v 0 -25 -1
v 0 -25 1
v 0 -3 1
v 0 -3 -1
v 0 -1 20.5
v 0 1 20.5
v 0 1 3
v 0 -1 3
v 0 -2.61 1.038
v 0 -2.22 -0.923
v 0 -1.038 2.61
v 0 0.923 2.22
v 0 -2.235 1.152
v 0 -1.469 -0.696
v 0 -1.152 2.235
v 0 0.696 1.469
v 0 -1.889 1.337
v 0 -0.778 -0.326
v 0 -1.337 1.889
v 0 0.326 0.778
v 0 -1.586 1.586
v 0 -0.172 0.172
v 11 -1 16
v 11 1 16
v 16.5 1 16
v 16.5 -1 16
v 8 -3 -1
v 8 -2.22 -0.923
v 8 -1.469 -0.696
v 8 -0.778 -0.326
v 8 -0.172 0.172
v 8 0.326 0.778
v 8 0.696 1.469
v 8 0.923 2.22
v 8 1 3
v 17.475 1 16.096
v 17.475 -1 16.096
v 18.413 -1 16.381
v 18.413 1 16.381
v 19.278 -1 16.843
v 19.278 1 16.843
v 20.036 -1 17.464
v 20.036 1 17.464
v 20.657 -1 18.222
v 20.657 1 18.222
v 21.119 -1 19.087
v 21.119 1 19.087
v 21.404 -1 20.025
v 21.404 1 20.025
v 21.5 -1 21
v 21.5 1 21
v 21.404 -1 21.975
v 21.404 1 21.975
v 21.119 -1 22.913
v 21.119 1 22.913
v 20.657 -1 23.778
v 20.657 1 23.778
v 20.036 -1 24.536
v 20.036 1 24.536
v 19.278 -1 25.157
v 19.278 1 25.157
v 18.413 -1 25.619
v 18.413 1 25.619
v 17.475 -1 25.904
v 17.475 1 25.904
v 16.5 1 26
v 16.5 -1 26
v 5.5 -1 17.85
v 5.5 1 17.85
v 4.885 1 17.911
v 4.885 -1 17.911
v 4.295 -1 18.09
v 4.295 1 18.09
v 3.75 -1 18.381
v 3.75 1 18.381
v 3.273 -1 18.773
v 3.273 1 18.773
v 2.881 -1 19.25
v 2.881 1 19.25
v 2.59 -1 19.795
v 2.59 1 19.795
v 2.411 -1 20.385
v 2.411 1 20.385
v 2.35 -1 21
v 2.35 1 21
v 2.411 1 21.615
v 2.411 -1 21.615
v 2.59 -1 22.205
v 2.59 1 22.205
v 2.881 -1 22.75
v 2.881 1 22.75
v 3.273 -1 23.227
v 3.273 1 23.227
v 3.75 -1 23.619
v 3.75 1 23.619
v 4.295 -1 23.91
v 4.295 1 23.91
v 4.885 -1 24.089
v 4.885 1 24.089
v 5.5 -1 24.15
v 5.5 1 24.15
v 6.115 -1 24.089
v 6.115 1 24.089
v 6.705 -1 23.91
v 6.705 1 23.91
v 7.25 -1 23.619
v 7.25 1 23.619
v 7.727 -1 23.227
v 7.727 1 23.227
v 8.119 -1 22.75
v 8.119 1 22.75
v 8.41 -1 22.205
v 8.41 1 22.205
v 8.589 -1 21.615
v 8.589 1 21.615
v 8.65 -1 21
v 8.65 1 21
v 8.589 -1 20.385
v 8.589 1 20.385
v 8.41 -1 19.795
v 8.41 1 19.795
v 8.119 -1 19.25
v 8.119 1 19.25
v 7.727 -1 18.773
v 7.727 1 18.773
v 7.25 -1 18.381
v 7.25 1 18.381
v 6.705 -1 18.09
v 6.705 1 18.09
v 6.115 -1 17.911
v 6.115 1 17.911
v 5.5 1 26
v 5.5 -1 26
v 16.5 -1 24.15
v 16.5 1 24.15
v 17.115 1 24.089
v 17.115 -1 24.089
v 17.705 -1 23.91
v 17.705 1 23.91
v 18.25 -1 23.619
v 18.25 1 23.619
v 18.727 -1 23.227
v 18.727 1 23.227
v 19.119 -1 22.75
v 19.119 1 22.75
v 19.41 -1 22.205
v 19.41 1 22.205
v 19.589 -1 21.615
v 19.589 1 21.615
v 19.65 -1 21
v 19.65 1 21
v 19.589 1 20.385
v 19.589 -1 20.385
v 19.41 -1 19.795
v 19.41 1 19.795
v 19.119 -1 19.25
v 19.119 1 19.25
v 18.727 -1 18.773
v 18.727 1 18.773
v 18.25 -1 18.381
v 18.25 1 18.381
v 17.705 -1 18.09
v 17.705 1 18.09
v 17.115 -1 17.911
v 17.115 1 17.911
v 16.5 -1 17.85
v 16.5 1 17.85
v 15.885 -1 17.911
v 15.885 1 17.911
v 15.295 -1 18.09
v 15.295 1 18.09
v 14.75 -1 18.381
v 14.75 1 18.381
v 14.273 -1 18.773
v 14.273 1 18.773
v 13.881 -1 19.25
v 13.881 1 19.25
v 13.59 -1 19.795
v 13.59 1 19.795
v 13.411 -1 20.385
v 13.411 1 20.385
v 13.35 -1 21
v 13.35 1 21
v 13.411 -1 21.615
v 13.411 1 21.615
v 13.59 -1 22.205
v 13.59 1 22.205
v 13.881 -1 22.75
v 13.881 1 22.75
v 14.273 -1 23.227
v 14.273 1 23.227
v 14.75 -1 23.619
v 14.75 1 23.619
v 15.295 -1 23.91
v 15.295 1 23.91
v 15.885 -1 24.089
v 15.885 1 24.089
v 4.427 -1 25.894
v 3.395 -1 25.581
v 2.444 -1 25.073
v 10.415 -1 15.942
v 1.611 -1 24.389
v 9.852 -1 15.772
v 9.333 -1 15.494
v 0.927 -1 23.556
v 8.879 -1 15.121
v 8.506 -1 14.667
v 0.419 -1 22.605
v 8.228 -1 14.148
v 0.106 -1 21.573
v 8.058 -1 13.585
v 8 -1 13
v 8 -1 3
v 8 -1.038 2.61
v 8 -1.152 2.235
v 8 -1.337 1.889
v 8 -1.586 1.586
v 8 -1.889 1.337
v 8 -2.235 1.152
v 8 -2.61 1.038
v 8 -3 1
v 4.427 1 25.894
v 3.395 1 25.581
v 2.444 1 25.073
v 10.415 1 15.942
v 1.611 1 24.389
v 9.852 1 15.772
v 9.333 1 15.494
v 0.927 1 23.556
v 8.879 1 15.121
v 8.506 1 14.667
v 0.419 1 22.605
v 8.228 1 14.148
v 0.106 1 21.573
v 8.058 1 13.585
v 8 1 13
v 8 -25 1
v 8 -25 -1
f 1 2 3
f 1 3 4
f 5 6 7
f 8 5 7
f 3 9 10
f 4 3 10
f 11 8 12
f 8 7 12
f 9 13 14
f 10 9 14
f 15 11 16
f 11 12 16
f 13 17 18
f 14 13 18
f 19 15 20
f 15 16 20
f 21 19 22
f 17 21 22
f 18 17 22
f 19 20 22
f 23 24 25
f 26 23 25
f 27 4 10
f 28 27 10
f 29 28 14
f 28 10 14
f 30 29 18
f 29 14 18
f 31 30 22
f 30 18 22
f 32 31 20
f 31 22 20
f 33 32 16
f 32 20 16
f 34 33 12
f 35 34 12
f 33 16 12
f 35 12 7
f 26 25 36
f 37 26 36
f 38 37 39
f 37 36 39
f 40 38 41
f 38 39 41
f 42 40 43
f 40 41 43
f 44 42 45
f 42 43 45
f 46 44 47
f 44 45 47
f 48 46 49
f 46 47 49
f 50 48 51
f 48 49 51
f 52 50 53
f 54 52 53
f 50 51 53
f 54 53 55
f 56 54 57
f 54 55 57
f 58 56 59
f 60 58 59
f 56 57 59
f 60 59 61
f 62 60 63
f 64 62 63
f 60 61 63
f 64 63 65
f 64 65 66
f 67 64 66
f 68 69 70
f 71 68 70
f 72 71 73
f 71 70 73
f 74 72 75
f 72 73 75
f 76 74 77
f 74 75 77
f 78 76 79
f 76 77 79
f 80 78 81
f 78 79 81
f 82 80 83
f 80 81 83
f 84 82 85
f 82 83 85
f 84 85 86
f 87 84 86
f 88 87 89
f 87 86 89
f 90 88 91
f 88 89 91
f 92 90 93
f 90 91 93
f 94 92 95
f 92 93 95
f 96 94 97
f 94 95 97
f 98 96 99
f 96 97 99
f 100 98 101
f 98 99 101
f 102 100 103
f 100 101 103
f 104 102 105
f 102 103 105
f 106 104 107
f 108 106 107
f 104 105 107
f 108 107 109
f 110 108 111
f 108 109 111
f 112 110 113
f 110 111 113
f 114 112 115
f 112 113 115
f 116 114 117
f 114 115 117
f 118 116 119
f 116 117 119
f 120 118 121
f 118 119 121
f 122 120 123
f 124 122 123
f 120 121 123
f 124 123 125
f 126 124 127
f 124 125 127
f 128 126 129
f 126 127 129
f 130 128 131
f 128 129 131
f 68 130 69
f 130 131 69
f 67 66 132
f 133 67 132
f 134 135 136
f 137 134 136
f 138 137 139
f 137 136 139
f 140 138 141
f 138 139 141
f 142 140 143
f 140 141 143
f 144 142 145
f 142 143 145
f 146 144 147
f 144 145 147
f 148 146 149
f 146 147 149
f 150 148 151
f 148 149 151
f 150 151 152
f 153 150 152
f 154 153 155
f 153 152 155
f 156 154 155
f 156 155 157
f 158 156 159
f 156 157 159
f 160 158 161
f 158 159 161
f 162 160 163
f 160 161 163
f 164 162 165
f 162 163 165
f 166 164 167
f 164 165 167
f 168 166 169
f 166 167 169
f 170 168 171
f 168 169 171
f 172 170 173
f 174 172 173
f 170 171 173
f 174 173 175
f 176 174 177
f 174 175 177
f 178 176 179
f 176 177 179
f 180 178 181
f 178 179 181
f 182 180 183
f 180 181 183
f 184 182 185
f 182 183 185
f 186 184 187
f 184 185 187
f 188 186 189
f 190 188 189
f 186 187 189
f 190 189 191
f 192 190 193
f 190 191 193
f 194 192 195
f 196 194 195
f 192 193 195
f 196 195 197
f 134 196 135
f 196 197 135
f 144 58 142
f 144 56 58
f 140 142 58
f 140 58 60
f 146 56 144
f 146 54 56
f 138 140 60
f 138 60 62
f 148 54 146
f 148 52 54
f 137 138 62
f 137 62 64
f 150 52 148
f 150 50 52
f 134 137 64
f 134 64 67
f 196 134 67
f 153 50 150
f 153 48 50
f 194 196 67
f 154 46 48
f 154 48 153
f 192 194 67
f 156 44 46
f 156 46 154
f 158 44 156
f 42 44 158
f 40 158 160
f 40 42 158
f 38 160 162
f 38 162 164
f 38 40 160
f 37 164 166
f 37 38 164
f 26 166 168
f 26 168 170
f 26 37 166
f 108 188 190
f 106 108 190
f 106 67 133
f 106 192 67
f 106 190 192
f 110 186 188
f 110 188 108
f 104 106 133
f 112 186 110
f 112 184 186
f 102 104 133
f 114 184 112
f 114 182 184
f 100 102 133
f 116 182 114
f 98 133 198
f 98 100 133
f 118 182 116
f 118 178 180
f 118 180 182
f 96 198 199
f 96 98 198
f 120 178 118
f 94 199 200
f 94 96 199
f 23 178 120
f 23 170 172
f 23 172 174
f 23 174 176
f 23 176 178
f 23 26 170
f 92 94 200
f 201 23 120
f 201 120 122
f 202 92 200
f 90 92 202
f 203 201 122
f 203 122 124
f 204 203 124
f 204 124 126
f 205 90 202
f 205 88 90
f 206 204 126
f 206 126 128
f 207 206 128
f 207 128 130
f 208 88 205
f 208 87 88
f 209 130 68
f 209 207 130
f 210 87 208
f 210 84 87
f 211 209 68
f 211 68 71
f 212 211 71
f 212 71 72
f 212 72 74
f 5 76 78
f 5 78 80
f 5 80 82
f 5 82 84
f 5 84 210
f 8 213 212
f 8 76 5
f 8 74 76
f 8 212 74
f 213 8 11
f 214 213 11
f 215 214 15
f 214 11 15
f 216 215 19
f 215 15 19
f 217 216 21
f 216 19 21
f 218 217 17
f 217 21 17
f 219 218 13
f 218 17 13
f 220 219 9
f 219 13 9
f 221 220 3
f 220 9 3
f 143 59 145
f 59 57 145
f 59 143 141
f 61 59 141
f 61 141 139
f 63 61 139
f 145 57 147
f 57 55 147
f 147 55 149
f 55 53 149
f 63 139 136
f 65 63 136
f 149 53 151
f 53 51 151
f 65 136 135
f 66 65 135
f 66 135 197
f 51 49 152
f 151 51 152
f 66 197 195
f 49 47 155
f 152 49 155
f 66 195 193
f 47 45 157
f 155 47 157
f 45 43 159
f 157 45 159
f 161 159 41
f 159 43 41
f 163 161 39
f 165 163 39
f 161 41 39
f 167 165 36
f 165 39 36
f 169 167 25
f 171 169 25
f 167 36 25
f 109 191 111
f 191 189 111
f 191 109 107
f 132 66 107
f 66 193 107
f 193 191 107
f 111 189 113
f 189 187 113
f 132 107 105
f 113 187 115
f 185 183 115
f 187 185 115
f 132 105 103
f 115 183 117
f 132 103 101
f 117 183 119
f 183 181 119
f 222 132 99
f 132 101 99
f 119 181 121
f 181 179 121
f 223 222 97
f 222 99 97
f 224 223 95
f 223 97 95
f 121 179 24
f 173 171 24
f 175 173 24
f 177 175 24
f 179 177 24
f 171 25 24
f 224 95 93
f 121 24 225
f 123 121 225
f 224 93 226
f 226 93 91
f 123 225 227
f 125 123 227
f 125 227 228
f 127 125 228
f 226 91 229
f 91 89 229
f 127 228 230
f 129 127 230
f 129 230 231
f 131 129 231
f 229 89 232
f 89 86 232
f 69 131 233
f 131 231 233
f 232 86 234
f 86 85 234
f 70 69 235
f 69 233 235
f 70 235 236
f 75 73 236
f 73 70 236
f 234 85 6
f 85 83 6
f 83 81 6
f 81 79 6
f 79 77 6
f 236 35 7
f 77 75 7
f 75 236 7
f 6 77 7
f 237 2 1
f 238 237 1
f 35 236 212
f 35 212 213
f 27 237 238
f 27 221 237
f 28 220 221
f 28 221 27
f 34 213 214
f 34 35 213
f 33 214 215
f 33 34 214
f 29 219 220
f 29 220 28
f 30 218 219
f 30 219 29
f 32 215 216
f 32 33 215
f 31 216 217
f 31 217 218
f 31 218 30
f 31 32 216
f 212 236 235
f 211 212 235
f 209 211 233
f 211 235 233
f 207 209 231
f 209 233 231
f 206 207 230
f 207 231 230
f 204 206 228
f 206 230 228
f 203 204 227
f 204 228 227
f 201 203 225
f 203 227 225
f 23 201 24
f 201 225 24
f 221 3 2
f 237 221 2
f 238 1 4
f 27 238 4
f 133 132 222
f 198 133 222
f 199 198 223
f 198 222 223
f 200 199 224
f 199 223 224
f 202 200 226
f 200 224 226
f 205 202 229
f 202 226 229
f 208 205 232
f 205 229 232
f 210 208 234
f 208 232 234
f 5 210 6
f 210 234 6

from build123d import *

# Parameters (mm, degrees)
EXTRUDE_THIN1_DEPTH = 8
CHAMFER1_SIZE       = 6
SKETCH2_R           = 3.15
BOSS_EXTRUDE1_DEPTH = 2
SKETCH3_R           = 3.15
CUT_EXTRUDE1_DEPTH  = 10.6


with BuildPart() as part:
    # Sketch1 → Extrude-Thin1 (new body)
    with BuildSketch(Plane(origin=(0, 0, 0), x_dir=(0, 0, -1), z_dir=(1, 0, 0))):
        with BuildLine():
            Line((1, -25), (1, -3))
            ThreePointArc((1, -3), (-0.171572875, -0.171572875), (-3, 1))
            Line((-3, 1), (-21, 1))
            Line((-21, 1), (-21, -1))
            Line((-21, -1), (-3, -1))
            ThreePointArc((-3, -1), (-1.585786438, -1.585786438), (-1, -3))
            Line((-1, -3), (-1, -25))
            Line((-1, -25), (1, -25))
        make_face()
    extrude(amount=EXTRUDE_THIN1_DEPTH)

    # Chamfer1
    chamfer1_edges = [part.edges().sort_by_distance(p)[0] for p in [
        (0, 0, 21),
    ]]
    chamfer(chamfer1_edges, length=CHAMFER1_SIZE)

    # Sketch2 → Boss-Extrude1 (add)
    with BuildSketch(Plane(origin=(0, 1, 0), x_dir=(1, 0, 0), z_dir=(0, 1, 0))):
        with BuildLine():
            Line((0, -20.5), (0, -3))
            Line((0, -3), (8, -13))
            ThreePointArc((8, -13), (8.878679656, -15.121320344), (11, -16))
            Line((11, -16), (16.5, -16))
            ThreePointArc((16.5, -16), (21.5, -21), (16.5, -26))
            Line((16.5, -26), (5.5, -26))
            ThreePointArc((5.5, -26), (1.610912703, -24.389087297), (0, -20.5))
        make_face()
        with Locations(Location((16.5, -21, 0), (0, 0, 270))):
            Circle(SKETCH2_R, mode=Mode.SUBTRACT)
        with Locations((5.5, -21)):
            Circle(SKETCH2_R, mode=Mode.SUBTRACT)
    extrude(amount=-BOSS_EXTRUDE1_DEPTH)

    # Sketch3 → Cut-Extrude1 (cut)
    with BuildSketch(Plane(origin=(0, 1, 0), x_dir=(1, 0, 0), z_dir=(0, 1, 0))):
        with Locations(Location((5.5, -21, 0), (0, 0, 90))):
            Circle(SKETCH3_R)
    extrude(amount=-CUT_EXTRUDE1_DEPTH, mode=Mode.SUBTRACT)


solid = part.part
